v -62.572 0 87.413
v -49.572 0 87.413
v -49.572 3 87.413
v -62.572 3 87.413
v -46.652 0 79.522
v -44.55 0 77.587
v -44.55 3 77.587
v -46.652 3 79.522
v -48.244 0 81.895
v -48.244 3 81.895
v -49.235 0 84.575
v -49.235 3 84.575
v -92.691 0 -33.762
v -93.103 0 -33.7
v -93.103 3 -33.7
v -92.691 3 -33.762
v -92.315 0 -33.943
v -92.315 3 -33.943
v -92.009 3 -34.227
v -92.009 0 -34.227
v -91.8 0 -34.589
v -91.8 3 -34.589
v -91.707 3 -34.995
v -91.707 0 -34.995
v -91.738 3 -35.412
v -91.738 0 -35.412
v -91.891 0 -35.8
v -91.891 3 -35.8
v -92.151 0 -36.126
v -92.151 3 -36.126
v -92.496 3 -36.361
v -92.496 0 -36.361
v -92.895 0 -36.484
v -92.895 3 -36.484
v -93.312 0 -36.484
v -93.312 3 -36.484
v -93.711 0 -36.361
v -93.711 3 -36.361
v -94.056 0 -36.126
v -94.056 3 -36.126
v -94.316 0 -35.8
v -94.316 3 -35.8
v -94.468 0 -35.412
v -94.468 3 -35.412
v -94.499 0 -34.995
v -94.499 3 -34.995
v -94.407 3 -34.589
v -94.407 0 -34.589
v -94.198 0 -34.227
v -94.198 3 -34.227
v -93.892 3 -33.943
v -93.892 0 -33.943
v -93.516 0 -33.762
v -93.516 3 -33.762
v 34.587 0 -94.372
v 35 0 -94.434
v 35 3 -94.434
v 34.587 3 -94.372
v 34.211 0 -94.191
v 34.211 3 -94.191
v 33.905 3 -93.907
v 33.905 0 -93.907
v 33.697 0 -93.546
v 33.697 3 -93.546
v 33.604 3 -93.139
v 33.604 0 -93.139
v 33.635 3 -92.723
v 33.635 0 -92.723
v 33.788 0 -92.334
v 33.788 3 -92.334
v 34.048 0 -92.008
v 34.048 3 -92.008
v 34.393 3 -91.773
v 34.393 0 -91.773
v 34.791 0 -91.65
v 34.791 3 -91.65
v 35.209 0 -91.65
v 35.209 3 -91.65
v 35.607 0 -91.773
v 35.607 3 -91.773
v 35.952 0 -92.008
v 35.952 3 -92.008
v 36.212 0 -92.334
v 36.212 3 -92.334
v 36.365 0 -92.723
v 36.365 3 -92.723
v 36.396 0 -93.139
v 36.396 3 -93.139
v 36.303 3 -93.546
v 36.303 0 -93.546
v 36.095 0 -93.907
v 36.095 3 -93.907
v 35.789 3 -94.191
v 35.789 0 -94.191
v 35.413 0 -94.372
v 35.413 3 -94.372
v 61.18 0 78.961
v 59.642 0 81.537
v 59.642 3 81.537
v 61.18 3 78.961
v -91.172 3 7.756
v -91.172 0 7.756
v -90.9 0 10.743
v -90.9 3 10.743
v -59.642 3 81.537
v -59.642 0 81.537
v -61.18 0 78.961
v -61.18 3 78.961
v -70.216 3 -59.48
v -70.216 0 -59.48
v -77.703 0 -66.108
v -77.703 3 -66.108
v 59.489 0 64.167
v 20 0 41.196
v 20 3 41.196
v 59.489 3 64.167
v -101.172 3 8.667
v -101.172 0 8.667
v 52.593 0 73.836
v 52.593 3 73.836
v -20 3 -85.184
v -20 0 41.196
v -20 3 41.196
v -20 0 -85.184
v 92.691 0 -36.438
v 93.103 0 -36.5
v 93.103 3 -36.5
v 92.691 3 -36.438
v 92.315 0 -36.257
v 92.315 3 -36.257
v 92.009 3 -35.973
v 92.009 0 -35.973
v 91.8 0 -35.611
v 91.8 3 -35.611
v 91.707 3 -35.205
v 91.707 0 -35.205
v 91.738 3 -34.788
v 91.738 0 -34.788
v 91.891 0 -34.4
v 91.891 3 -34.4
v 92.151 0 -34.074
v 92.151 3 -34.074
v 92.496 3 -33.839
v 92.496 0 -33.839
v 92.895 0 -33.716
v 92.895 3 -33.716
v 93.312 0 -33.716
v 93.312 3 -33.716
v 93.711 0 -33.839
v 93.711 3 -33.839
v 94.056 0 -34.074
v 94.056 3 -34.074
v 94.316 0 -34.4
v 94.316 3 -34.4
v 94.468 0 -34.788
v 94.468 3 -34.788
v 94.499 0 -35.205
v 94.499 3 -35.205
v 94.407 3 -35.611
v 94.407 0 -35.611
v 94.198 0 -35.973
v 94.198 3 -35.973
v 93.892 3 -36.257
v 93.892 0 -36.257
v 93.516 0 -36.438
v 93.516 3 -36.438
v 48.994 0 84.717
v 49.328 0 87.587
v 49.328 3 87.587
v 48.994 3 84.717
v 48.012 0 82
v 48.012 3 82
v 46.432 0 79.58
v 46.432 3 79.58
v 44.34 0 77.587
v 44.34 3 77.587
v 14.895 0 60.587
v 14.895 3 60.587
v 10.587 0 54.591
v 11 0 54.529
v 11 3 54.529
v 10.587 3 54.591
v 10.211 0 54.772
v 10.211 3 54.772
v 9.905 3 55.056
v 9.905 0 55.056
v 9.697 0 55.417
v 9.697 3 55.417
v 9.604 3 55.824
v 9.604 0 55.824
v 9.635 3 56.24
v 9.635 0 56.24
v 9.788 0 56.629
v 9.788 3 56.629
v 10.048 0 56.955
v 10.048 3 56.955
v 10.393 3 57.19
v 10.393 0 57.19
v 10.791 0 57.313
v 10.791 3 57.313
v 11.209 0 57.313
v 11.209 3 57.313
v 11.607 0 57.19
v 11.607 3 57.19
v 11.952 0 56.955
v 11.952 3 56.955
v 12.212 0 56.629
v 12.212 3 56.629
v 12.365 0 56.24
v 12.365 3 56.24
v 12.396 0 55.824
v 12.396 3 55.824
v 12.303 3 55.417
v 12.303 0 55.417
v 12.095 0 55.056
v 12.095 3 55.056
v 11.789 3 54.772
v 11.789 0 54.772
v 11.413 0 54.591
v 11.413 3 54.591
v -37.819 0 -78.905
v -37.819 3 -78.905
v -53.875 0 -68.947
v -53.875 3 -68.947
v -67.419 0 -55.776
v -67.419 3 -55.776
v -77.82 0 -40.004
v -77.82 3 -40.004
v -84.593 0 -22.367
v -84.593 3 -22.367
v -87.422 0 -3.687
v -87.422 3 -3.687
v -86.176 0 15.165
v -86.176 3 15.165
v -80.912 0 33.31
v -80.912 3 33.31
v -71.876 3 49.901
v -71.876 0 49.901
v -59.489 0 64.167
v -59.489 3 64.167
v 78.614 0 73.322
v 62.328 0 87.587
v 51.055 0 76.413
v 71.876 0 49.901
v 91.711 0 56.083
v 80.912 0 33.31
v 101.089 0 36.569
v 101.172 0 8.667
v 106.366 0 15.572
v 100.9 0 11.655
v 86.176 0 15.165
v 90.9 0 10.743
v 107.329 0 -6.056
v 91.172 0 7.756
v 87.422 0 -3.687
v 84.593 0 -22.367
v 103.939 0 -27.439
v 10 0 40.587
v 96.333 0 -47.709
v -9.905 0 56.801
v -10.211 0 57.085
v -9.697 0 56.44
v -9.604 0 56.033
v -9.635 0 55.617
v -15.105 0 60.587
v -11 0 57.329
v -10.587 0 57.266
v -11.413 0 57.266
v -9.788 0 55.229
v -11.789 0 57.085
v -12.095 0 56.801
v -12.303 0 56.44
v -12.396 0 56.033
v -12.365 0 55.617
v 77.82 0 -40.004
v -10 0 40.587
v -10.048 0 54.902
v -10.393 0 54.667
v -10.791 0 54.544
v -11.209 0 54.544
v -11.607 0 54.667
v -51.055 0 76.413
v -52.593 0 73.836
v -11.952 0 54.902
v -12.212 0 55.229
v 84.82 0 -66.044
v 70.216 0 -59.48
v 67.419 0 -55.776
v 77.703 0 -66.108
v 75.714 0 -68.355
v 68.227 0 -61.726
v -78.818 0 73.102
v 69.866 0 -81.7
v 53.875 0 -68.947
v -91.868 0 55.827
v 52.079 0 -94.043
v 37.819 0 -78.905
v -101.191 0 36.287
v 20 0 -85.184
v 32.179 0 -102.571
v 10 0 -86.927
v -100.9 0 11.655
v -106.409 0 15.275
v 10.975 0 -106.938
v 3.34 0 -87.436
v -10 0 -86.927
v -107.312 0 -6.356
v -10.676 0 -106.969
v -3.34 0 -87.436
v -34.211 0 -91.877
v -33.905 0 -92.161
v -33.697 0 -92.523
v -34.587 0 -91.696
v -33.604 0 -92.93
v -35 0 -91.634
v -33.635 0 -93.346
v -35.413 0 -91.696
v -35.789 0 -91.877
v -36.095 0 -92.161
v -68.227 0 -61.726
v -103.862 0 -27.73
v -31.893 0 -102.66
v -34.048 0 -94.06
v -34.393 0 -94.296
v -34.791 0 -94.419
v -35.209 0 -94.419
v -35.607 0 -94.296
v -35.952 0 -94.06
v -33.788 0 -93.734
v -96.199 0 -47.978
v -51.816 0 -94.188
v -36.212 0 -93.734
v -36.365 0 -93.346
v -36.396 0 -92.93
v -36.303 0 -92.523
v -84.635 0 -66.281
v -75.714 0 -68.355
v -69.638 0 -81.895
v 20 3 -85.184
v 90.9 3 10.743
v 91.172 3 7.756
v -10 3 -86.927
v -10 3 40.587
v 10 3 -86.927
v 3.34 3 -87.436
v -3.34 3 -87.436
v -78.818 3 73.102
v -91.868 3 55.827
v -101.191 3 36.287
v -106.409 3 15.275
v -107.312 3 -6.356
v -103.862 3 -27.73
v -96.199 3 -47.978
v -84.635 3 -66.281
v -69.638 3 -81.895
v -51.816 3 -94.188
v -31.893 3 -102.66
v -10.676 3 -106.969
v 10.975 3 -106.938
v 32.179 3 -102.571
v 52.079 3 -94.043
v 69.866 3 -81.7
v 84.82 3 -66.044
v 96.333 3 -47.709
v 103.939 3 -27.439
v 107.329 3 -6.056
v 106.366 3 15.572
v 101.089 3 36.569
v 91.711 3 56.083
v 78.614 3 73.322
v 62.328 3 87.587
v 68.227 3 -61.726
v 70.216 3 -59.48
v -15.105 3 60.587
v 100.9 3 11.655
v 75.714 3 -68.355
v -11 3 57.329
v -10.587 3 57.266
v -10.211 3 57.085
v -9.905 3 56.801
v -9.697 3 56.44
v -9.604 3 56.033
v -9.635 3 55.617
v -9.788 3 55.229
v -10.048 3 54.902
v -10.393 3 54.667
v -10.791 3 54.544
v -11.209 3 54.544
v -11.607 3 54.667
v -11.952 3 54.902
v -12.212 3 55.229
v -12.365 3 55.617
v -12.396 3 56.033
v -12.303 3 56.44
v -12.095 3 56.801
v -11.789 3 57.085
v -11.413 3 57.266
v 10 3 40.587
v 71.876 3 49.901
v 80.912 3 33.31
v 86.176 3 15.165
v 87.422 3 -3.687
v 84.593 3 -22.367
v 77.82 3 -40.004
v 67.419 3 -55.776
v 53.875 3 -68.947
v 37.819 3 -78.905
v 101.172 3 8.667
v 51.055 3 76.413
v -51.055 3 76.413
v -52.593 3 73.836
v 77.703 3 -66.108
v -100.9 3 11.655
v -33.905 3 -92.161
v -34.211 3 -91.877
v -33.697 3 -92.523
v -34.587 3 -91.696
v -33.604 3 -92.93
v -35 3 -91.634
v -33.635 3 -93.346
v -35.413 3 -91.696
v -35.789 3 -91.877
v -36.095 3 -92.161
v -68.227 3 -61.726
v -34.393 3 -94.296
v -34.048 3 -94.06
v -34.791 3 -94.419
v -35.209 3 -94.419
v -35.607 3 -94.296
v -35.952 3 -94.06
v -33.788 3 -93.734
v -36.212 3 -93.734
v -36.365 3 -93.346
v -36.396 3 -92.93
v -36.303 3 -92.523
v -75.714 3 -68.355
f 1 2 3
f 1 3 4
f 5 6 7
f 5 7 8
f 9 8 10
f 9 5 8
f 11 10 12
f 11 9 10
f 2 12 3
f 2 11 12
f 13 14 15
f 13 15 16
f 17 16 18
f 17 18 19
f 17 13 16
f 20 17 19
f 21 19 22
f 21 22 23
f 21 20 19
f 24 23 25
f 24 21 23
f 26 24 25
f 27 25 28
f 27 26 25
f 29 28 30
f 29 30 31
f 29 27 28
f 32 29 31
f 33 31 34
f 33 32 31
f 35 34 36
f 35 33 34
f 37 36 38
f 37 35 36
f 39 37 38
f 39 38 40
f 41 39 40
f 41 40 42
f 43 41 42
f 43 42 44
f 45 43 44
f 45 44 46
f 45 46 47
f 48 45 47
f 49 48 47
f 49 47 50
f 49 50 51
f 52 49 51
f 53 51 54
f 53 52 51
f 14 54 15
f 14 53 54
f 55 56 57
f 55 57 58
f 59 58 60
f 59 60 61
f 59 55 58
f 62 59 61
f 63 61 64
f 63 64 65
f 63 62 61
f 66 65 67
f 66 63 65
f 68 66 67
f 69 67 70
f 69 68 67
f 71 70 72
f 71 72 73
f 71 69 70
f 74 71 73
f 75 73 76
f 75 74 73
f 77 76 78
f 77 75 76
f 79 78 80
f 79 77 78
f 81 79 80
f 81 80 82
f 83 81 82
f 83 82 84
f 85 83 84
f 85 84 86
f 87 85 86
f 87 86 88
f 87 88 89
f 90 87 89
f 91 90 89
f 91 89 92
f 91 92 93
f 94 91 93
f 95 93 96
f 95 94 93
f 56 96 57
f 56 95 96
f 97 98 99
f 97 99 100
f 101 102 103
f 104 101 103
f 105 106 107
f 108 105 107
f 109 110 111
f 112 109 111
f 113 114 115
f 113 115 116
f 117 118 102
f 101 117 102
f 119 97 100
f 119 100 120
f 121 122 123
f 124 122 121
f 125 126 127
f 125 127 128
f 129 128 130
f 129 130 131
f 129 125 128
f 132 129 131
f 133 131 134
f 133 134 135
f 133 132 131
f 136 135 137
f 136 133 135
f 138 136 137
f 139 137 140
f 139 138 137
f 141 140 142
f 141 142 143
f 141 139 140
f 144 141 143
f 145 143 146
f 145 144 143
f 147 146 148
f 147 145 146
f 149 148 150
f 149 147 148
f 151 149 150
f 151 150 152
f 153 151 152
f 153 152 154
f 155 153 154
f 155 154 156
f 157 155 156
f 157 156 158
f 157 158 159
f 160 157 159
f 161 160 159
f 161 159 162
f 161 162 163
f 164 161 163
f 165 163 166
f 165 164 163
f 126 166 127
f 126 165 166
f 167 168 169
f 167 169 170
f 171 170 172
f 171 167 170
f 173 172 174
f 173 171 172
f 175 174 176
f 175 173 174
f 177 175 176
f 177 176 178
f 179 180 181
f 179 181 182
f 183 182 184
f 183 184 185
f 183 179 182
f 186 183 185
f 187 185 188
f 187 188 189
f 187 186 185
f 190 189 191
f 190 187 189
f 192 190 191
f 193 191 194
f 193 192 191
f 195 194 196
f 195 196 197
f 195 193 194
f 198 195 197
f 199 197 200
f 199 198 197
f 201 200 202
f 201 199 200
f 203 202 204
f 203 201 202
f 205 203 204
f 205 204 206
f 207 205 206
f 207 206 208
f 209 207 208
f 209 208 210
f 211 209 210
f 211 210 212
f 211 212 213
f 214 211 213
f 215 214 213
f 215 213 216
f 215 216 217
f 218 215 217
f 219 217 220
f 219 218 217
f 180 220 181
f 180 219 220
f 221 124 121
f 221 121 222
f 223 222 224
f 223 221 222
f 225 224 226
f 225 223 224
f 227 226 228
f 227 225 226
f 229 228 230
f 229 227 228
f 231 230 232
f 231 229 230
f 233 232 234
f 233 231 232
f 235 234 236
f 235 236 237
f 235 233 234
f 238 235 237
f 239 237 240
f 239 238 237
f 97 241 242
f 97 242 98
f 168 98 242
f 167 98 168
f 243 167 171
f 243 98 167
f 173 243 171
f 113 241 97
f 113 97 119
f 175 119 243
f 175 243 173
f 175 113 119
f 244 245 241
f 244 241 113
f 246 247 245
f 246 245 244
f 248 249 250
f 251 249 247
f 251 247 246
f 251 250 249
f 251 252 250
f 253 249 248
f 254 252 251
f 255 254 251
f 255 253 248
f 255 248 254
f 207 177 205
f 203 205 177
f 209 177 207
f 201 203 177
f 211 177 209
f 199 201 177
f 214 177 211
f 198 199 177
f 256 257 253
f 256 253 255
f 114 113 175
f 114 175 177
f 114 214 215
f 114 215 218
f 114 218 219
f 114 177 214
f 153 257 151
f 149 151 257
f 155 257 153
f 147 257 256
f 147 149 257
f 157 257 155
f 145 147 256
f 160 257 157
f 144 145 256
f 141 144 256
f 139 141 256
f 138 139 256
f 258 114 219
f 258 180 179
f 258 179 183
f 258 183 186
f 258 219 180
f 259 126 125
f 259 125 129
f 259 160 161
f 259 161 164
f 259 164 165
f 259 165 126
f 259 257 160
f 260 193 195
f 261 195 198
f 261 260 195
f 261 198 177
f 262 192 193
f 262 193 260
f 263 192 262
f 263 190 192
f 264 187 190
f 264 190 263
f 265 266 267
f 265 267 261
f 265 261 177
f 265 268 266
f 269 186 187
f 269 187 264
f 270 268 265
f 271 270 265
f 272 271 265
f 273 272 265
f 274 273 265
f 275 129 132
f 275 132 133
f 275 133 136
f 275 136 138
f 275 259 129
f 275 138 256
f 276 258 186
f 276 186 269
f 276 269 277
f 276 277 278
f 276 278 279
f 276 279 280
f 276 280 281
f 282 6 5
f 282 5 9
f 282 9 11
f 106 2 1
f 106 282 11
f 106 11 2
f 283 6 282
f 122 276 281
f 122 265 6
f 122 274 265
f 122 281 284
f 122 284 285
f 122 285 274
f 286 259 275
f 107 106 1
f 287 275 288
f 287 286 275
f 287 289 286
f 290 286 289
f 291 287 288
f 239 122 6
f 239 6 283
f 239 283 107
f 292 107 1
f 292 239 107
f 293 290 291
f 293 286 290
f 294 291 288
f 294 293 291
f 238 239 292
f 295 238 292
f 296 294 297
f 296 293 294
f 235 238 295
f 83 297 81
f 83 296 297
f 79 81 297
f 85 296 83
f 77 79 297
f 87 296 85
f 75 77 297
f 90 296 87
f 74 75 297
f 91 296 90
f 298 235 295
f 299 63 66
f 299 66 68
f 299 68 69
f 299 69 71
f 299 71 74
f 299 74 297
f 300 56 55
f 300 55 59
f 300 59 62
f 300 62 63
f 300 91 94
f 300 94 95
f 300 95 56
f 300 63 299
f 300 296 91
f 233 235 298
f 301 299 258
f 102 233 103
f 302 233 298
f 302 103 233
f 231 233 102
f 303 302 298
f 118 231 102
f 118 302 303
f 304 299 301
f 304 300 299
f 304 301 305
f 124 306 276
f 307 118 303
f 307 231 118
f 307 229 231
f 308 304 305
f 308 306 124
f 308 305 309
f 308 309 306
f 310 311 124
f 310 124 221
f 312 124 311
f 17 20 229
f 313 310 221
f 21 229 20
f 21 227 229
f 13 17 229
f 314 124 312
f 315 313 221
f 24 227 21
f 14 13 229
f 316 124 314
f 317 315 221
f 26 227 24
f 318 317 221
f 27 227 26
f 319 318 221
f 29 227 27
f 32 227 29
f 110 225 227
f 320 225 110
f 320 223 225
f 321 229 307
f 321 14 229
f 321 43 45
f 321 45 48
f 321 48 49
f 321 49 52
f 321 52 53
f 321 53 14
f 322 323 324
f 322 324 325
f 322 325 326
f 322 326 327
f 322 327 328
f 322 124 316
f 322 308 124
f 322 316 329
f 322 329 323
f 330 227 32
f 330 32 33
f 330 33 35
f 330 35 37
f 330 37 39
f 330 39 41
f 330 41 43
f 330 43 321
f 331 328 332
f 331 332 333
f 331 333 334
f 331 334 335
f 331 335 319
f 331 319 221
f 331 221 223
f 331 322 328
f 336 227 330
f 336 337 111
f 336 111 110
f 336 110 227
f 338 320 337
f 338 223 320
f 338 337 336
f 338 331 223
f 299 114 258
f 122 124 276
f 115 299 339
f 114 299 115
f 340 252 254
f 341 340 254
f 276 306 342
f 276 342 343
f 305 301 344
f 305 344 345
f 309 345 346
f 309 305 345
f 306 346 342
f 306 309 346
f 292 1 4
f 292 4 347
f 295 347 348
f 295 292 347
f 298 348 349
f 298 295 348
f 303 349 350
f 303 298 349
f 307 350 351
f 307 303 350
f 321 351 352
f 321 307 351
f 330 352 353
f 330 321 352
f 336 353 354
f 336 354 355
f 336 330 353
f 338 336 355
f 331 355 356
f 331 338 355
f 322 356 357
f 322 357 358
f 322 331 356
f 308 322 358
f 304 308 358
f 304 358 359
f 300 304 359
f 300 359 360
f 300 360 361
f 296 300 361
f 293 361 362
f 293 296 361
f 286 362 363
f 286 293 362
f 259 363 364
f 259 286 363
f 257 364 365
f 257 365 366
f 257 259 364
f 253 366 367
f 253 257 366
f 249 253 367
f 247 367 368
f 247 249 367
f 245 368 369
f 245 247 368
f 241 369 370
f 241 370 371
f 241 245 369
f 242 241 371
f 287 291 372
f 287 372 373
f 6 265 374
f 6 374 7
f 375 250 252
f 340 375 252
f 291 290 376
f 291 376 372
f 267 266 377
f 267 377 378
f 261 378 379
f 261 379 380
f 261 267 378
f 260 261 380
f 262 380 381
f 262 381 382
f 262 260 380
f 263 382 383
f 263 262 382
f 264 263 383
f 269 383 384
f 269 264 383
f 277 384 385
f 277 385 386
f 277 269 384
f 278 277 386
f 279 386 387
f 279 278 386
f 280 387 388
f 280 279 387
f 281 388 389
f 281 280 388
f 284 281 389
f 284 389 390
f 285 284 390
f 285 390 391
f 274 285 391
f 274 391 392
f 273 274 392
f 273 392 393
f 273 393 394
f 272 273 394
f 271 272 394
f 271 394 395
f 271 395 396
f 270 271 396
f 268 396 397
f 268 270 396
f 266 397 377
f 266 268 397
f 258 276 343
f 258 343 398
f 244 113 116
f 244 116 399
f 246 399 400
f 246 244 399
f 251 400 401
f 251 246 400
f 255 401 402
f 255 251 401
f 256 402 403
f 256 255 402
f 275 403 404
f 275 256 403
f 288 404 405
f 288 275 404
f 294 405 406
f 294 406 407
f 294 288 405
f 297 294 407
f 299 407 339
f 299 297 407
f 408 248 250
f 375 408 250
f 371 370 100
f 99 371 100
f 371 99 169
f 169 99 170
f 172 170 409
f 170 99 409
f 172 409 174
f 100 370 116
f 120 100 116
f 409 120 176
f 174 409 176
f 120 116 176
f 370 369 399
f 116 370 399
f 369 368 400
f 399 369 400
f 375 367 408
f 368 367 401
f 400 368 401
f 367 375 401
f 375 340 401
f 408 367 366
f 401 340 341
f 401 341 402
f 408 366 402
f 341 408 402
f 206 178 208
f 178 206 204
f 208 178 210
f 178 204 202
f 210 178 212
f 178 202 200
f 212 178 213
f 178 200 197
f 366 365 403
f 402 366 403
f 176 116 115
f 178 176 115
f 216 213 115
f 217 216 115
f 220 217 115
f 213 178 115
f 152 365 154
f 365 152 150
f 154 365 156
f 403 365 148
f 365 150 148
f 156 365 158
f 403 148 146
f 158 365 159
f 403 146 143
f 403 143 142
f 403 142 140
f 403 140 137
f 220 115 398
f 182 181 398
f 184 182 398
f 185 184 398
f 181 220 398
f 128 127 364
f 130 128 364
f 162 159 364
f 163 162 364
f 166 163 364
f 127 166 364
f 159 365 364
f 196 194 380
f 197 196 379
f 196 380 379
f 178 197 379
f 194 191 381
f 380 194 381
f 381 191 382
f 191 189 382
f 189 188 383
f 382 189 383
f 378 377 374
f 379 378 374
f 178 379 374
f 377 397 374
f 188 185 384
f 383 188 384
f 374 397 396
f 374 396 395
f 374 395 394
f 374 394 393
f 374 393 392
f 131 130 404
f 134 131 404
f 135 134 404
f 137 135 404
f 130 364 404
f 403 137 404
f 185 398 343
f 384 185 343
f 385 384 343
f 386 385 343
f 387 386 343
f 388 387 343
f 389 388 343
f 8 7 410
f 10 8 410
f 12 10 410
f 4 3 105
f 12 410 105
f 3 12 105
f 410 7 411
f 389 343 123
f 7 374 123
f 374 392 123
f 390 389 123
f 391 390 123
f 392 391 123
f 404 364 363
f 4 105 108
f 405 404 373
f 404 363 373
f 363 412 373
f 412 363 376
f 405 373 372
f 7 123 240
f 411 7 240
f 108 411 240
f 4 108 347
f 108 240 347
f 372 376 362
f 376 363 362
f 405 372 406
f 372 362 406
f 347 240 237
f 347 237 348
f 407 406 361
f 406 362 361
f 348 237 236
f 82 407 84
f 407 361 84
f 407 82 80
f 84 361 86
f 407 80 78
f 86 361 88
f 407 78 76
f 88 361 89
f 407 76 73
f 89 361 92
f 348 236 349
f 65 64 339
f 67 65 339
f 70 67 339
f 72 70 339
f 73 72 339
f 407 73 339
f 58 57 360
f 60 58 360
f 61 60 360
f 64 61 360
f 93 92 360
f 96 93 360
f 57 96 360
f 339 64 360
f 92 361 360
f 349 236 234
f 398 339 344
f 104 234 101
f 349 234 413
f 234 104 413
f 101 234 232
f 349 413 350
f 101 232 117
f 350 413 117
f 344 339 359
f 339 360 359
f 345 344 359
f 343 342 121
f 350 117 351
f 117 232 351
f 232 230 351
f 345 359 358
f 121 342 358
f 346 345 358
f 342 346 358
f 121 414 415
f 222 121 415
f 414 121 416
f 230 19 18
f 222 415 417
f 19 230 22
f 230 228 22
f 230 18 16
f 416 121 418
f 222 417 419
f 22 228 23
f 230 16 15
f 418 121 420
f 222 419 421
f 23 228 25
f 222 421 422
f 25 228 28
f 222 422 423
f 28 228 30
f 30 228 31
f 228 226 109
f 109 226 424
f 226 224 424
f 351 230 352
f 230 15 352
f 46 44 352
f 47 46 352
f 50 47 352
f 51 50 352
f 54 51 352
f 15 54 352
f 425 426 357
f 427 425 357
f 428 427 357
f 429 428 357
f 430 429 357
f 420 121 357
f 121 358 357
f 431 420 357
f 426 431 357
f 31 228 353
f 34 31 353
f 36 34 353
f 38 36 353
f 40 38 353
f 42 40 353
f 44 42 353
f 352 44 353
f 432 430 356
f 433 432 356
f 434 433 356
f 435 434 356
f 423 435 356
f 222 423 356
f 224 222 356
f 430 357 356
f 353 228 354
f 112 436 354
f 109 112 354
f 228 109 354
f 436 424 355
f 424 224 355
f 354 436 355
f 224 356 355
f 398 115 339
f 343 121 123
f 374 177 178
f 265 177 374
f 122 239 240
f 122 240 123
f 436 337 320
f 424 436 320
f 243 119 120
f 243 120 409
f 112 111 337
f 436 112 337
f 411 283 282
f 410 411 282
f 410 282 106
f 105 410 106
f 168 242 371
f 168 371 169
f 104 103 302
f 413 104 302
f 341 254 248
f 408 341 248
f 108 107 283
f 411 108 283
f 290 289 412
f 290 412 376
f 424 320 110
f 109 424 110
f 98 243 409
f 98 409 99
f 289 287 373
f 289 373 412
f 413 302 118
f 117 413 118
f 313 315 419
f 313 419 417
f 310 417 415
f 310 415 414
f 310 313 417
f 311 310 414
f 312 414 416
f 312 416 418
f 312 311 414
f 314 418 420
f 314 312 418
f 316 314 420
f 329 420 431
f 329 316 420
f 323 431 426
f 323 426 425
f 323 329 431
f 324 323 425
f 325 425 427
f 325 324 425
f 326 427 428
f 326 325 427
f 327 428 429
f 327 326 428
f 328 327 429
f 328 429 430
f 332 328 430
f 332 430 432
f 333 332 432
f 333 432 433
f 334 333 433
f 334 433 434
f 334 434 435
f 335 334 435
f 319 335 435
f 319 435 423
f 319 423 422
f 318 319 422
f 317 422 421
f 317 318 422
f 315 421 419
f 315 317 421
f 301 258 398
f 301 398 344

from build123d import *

# Parameters (mm, degrees)
SKETCH5_R           = 1.4
BOSS_EXTRUDE1_DEPTH = 3


with BuildPart() as part:
    # Sketch5 → Boss-Extrude1 (new body)
    with BuildSketch(Plane(origin=(0, 0, 0), x_dir=(1, 0, 0), z_dir=(0, 1, 0))):
        with BuildLine():
            Line((-49.57228919, -87.412577044), (-62.57228919, -87.412577044))
            ThreePointArc((-62.57228919, -87.412577044), (0.15026567, 107.499894978), (62.32767078, -87.5871649))
            Line((62.32767078, -87.5871649), (49.32767078, -87.5871649))
            ThreePointArc((49.32767078, -87.5871649), (48.011633262, -81.999797234), (44.340215544, -77.5871649))
            Line((44.340215544, -77.5871649), (14.895351815, -60.5871649))
            Line((14.895351815, -60.5871649), (-15.104648185, -60.5871649))
            Line((-15.104648185, -60.5871649), (-44.549511914, -77.5871649))
            ThreePointArc((-44.549511914, -77.5871649), (-48.243794441, -81.895172415), (-49.57228919, -87.412577044))
        make_face()
        with Locations(Location((-93.103383397, 35.1, 0), (0, 0, 270))):
            Circle(SKETCH5_R, mode=Mode.SUBTRACT)
        with Locations(Location((35, 93.034187265, 0), (0, 0, 90))):
            Circle(SKETCH5_R, mode=Mode.SUBTRACT)
        with Locations(Location((-35, 93.034187265, 0), (0, 0, 270))):
            Circle(SKETCH5_R, mode=Mode.SUBTRACT)
        with Locations(Location((93.103383397, 35.1, 0), (0, 0, 90))):
            Circle(SKETCH5_R, mode=Mode.SUBTRACT)
        with Locations(Location((-11, -55.928525816, 0), (0, 0, 270))):
            Circle(SKETCH5_R, mode=Mode.SUBTRACT)
        with Locations(Location((11, -55.928525816, 0), (0, 0, 90))):
            Circle(SKETCH5_R, mode=Mode.SUBTRACT)
        with BuildLine():
            Line((-59.488560992, -64.166666667), (-20, -41.195529316))
            Line((-20, -41.195529316), (-20, 85.183625187))
            ThreePointArc((-20, 85.183625187), (-84.593056756, 22.366598952), (-59.488560992, -64.166666667))
        make_face(mode=Mode.SUBTRACT)
        with BuildLine():
            Line((-10, -40.5871649), (10, -40.5871649))
            Line((10, -40.5871649), (10, 86.926693254))
            ThreePointArc((10, 86.926693254), (0, 87.5), (-10, 86.926693254))
            Line((-10, 86.926693254), (-10, -40.5871649))
        make_face(mode=Mode.SUBTRACT)
        with BuildLine():
            Line((20, -41.195529316), (59.488560992, -64.166666667))
            ThreePointArc((59.488560992, -64.166666667), (84.593056756, 22.366598952), (20, 85.183625187))
            Line((20, 85.183625187), (20, -41.195529316))
        make_face(mode=Mode.SUBTRACT)
        Polygon((-100.9, -11.654989132), (-101.17241918, -8.667383437), (-91.17241918, -7.755552333), (-90.9, -10.743158028), align=None, mode=Mode.SUBTRACT)
        Polygon((-77.70280139, 66.108380167), (-75.71415707, 68.354553306), (-68.226913275, 61.725738906), (-70.215557595, 59.479565767), align=None, mode=Mode.SUBTRACT)
        Polygon((77.70280139, 66.108380167), (75.71415707, 68.354553306), (68.226913275, 61.725738906), (70.215557595, 59.479565767), align=None, mode=Mode.SUBTRACT)
        Polygon((100.9, -11.654989132), (90.9, -10.743158028), (91.17241918, -7.755552333), (101.17241918, -8.667383437), align=None, mode=Mode.SUBTRACT)
        Polygon((-61.179766354, -78.961014389), (-52.592640519, -73.836439294), (-51.055267991, -76.412577044), (-59.642393825, -81.537152139), align=None, mode=Mode.SUBTRACT)
        Polygon((52.592640519, -73.836439294), (51.055267991, -76.412577044), (59.642393825, -81.537152139), (61.179766354, -78.961014389), align=None, mode=Mode.SUBTRACT)
    extrude(amount=BOSS_EXTRUDE1_DEPTH)


solid = part.part
